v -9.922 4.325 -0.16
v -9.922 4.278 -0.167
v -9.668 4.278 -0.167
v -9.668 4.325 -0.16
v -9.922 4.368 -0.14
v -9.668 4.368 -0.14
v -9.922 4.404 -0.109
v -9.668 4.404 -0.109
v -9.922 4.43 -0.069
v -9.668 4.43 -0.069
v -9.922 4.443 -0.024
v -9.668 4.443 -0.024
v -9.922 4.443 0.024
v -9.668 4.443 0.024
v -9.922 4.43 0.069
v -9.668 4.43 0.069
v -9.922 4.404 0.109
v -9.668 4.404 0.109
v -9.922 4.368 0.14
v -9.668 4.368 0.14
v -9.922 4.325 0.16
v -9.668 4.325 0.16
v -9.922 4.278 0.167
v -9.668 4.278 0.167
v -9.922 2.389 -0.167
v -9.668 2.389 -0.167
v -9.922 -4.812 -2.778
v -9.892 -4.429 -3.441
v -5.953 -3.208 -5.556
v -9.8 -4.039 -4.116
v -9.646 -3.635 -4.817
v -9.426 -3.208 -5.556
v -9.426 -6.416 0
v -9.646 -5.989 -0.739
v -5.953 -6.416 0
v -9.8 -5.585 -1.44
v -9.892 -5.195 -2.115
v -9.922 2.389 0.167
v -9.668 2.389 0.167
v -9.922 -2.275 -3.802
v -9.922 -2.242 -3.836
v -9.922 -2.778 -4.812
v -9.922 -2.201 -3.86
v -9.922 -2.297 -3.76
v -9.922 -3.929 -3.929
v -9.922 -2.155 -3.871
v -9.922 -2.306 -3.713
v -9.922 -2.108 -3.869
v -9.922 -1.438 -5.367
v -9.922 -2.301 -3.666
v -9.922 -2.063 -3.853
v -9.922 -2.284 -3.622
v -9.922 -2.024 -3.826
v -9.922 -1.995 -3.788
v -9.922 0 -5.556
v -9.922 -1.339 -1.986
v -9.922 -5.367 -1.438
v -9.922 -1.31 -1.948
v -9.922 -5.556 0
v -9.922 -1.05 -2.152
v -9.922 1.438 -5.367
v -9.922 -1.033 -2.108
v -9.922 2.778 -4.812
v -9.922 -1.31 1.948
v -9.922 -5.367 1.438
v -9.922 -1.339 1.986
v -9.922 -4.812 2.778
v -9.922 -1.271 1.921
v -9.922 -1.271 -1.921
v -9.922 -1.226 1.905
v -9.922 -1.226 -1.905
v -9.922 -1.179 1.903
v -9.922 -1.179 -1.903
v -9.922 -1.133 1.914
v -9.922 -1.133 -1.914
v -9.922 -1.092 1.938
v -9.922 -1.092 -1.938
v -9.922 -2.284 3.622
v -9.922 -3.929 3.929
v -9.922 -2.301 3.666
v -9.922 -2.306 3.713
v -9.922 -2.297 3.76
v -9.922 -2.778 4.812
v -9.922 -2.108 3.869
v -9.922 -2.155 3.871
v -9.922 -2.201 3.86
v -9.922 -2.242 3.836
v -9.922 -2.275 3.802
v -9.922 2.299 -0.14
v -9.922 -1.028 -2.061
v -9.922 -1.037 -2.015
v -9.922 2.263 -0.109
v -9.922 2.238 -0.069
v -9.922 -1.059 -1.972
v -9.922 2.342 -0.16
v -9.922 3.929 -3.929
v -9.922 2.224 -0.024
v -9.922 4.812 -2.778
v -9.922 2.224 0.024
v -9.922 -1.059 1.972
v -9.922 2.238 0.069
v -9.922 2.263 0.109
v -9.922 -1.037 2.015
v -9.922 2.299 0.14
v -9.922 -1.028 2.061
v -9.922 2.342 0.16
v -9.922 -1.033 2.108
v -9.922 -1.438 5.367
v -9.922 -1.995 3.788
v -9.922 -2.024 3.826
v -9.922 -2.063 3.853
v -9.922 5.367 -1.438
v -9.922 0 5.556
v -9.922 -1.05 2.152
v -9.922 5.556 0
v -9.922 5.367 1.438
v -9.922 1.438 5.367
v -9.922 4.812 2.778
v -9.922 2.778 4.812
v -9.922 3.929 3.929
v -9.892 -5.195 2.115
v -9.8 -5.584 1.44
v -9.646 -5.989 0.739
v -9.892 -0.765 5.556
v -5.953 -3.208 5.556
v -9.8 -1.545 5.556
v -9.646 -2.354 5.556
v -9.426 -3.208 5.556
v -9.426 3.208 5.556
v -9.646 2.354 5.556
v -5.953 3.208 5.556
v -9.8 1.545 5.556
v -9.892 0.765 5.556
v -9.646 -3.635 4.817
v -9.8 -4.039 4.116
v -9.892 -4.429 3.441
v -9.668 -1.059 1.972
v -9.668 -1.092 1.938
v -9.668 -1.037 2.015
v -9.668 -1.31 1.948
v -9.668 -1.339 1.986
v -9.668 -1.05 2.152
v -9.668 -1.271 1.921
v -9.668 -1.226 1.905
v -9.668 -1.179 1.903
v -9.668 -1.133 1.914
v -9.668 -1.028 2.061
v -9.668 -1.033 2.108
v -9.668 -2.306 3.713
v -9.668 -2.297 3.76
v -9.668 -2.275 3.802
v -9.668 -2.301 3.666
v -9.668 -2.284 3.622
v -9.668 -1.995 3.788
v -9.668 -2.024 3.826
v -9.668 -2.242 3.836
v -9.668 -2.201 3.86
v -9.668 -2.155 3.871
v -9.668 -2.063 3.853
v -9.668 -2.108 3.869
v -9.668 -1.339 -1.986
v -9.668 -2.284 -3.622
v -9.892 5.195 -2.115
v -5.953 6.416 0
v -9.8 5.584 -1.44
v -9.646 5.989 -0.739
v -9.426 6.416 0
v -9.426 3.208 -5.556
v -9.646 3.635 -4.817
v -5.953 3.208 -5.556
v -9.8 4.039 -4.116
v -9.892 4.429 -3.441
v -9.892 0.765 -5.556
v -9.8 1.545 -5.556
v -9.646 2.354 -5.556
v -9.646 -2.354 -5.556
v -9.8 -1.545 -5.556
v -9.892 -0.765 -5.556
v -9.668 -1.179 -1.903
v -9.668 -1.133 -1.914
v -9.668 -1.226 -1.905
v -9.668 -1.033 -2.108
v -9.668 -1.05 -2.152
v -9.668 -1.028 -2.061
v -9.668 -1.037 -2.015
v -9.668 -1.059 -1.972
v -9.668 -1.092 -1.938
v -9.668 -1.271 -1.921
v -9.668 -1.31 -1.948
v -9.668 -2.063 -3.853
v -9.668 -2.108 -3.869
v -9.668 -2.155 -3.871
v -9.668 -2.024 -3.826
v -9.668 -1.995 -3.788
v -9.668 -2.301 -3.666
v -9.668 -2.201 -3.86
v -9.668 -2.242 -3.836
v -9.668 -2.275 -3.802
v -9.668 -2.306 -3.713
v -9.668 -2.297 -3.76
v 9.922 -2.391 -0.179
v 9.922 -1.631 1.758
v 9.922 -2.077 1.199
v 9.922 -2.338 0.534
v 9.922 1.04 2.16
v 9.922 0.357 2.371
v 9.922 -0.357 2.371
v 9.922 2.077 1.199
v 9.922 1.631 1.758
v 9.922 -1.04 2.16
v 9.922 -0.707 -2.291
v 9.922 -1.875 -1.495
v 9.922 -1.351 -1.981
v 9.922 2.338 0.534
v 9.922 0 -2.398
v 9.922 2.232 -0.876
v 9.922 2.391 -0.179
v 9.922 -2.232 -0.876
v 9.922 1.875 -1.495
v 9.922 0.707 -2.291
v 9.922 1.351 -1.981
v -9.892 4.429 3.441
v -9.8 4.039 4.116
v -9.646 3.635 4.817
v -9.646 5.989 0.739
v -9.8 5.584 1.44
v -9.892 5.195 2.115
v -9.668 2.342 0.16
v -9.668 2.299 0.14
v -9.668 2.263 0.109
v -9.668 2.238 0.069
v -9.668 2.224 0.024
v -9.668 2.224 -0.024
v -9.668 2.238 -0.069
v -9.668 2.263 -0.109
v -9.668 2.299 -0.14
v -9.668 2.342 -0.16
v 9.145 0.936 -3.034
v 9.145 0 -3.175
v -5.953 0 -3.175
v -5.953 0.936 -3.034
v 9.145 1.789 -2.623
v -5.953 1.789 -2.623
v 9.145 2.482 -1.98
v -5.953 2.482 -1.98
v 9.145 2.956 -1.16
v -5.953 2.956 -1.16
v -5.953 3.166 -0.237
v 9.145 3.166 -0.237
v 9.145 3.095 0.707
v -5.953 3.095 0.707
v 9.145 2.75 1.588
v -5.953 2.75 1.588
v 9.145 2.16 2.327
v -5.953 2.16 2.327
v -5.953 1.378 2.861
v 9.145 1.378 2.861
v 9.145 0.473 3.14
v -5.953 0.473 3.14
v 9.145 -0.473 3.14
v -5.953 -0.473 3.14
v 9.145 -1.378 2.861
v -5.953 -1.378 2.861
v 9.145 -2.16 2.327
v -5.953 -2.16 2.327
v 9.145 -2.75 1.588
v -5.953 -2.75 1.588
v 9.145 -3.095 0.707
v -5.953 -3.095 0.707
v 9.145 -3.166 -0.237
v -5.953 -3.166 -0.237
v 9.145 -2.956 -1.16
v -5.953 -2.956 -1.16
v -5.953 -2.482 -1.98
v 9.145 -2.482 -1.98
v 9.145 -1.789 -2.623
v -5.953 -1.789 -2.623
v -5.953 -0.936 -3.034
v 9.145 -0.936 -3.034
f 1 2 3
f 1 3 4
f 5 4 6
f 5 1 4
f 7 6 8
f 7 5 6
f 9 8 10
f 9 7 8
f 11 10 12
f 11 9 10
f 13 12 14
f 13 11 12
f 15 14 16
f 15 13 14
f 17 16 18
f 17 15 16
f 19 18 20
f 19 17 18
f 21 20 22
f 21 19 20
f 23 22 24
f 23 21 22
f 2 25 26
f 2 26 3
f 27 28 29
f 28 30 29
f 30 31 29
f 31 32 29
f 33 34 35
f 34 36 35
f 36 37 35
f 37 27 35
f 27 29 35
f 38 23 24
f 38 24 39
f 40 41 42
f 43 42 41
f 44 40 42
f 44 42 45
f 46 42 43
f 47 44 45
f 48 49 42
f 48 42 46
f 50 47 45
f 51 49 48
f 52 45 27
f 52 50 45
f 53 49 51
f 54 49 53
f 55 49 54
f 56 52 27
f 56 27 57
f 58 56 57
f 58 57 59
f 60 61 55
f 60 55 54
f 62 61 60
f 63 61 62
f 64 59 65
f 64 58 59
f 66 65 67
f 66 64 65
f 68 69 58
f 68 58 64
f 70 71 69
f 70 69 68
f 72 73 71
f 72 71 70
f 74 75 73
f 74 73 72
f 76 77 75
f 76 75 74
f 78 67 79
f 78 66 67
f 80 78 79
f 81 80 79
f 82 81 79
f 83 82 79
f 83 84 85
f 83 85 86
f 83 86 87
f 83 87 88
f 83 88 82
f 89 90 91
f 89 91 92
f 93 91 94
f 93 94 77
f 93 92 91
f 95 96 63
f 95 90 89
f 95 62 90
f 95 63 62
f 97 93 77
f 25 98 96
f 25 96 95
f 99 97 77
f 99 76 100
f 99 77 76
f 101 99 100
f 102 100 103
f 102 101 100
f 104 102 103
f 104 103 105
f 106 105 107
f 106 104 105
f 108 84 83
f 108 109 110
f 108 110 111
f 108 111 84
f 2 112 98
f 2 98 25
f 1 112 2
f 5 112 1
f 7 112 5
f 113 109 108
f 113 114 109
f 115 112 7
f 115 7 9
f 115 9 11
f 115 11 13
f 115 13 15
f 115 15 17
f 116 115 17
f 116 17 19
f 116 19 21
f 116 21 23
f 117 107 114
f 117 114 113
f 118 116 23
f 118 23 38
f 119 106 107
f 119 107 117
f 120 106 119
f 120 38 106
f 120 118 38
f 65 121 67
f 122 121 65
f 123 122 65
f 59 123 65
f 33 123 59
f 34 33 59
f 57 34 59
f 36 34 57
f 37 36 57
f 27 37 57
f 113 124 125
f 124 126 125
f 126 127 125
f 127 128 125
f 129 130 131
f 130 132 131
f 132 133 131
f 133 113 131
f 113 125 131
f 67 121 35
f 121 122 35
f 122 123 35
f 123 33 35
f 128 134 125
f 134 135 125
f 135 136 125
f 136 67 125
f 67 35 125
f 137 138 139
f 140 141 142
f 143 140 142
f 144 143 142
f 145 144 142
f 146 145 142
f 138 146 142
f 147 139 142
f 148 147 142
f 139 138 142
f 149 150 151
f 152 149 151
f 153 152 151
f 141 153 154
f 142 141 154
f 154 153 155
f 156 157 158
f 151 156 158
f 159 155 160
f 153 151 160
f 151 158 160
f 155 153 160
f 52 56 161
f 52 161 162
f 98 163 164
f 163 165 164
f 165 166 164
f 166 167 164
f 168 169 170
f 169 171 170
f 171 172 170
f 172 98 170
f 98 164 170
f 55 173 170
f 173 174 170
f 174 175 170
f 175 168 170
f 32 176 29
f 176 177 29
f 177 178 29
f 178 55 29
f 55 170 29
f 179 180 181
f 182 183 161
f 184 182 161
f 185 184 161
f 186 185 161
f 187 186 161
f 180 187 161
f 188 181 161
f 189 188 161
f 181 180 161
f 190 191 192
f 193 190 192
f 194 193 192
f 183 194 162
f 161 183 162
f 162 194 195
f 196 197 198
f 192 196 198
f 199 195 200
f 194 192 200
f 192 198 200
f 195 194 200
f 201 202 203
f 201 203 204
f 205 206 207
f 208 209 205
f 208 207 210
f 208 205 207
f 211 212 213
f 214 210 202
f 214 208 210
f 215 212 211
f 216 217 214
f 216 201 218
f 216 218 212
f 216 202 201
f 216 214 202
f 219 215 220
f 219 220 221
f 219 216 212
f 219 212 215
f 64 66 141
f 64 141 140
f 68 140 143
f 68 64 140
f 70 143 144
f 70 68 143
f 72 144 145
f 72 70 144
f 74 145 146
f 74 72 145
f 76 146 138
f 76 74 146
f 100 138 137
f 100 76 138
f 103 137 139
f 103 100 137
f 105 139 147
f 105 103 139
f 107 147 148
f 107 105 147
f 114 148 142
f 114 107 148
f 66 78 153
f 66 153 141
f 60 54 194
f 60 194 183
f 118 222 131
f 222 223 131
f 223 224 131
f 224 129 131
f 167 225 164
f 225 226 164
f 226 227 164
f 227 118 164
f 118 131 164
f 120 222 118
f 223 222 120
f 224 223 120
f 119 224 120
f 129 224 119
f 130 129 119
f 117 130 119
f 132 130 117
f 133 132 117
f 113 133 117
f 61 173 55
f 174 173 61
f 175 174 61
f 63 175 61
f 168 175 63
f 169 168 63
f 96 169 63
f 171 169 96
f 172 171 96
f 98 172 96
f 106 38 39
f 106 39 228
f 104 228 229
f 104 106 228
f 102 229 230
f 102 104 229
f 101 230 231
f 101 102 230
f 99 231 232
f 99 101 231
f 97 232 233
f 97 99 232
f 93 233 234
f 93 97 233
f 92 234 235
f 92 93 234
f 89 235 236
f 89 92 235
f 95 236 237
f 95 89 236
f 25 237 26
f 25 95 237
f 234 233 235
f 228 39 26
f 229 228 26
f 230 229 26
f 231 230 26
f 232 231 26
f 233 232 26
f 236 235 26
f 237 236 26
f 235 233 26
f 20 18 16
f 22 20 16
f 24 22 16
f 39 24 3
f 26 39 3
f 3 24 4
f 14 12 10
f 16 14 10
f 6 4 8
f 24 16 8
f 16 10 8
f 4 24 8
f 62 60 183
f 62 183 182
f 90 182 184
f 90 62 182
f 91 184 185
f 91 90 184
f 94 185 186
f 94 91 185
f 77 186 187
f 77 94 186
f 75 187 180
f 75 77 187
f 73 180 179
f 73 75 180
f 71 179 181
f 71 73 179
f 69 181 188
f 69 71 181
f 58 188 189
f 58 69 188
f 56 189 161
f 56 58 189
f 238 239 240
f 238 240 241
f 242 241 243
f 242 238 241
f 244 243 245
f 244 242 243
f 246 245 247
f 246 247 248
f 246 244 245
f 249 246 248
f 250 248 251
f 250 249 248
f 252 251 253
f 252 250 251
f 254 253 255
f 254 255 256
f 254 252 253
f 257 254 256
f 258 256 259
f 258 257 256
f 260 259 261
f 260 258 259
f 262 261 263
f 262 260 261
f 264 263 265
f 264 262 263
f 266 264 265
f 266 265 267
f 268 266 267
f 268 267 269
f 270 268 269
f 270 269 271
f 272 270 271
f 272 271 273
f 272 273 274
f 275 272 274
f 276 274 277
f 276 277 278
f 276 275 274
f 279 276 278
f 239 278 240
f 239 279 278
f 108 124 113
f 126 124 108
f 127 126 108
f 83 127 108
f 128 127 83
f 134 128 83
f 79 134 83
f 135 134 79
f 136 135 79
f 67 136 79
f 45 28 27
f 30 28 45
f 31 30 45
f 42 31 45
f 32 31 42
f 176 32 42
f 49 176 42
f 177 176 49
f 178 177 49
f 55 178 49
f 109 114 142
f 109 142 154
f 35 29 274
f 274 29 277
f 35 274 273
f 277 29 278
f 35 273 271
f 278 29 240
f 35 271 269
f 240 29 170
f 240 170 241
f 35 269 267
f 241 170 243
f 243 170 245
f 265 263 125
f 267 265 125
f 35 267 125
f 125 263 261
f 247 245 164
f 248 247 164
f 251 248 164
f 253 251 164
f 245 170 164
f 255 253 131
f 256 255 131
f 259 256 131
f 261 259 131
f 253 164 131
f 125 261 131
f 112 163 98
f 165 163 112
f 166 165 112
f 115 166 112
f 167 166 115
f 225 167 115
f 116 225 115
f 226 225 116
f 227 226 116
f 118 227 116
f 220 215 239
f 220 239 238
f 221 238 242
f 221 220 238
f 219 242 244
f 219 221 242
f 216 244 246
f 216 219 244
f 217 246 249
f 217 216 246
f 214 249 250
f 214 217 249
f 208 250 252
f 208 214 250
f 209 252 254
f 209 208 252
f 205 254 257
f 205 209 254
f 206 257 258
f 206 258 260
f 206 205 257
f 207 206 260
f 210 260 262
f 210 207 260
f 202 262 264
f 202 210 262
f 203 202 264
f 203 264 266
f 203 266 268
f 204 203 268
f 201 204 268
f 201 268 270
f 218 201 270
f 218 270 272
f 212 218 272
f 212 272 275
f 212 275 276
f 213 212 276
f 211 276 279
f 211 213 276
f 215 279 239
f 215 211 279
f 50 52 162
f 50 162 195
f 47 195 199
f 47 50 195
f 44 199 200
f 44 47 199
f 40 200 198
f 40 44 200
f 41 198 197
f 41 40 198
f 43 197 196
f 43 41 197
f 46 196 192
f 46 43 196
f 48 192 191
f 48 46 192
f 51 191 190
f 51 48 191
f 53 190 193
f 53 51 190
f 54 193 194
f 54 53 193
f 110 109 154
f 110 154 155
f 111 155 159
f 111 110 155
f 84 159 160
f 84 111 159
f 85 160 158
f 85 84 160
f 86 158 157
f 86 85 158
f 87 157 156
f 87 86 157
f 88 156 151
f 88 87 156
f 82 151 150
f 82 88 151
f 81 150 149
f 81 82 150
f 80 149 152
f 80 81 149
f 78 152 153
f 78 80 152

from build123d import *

# Parameters (mm, degrees)
SKETCH5_R           = 3.175
BOSS_EXTRUDE3_DEPTH = 15.875
CHAMFER1_SIZE       = 0.77724
BOSS_EXTRUDE4_DEPTH = 3.96875
SKETCH8_OUTSIDE_W   = 90.54
SKETCH8_OUTSIDE_H   = 92.26
SKETCH8_OUTSIDE_R   = 5.55625
CUT_EXTRUDE3_DEPTH  = 20.84375
CUT_EXTRUDE3_TAPER  = 60
CUT_EXTRUDE4_DEPTH  = 0.254
CIRPATTERN1_COUNT   = 3


with BuildPart() as part:
    # Sketch5 → Boss-Extrude3 (new body)
    with BuildSketch(Plane(origin=(9.921875, 0, 0), x_dir=(0, 0, -1), z_dir=(1, 0, 0))):
        Circle(SKETCH5_R)
    extrude(amount=-BOSS_EXTRUDE3_DEPTH)

    # Chamfer1
    chamfer1_edges = [part.edges().sort_by_distance(p)[0] for p in [
        (9.921875, 0, 3.175),
    ]]
    chamfer(chamfer1_edges, length=CHAMFER1_SIZE)

    # Sketch6 → Boss-Extrude4 (add)
    with BuildSketch(Plane.ZY.offset(5.953125)):
        Polygon((5.55625, 3.207902433), (0, 6.415804866), (-5.55625, 3.207902433), (-5.55625, -3.207902433), (0, -6.415804866), (5.55625, -3.207902433), align=None)
    extrude(amount=BOSS_EXTRUDE4_DEPTH)

    # Sketch8 outside → Cut-Extrude3 (cut, through all)
    with BuildSketch(Plane.ZY.offset(9.921875)):
        Rectangle(SKETCH8_OUTSIDE_W, SKETCH8_OUTSIDE_H)
        Circle(SKETCH8_OUTSIDE_R, mode=Mode.SUBTRACT)
    extrude(amount=-CUT_EXTRUDE3_DEPTH, taper=CUT_EXTRUDE3_TAPER, mode=Mode.SUBTRACT)

    # Sketch12 → Cut-Extrude4 (cut)
    with BuildSketch(Plane.ZY.offset(9.921875)):
        with BuildLine():
            Line((0.1666875, 4.2783125), (0.1666875, 2.3891875))
            ThreePointArc((0.1666875, 2.3891875), (0, 2.2225), (-0.1666875, 2.3891875))
            Line((-0.1666875, 2.3891875), (-0.1666875, 4.2783125))
            ThreePointArc((-0.1666875, 4.2783125), (0, 4.445), (0.1666875, 4.2783125))
        make_face()
    cut_extrude4 = extrude(amount=-CUT_EXTRUDE4_DEPTH, mode=Mode.SUBTRACT)

    # CirPattern1: Cut-Extrude4 ×3 about axis
    cirpattern1_axis = Axis((0, 0, 0), (1, 0, 0))
    for i in range(1, CIRPATTERN1_COUNT):
        add(cut_extrude4.rotate(cirpattern1_axis, i * 360 / CIRPATTERN1_COUNT), mode=Mode.SUBTRACT)


solid = part.part
